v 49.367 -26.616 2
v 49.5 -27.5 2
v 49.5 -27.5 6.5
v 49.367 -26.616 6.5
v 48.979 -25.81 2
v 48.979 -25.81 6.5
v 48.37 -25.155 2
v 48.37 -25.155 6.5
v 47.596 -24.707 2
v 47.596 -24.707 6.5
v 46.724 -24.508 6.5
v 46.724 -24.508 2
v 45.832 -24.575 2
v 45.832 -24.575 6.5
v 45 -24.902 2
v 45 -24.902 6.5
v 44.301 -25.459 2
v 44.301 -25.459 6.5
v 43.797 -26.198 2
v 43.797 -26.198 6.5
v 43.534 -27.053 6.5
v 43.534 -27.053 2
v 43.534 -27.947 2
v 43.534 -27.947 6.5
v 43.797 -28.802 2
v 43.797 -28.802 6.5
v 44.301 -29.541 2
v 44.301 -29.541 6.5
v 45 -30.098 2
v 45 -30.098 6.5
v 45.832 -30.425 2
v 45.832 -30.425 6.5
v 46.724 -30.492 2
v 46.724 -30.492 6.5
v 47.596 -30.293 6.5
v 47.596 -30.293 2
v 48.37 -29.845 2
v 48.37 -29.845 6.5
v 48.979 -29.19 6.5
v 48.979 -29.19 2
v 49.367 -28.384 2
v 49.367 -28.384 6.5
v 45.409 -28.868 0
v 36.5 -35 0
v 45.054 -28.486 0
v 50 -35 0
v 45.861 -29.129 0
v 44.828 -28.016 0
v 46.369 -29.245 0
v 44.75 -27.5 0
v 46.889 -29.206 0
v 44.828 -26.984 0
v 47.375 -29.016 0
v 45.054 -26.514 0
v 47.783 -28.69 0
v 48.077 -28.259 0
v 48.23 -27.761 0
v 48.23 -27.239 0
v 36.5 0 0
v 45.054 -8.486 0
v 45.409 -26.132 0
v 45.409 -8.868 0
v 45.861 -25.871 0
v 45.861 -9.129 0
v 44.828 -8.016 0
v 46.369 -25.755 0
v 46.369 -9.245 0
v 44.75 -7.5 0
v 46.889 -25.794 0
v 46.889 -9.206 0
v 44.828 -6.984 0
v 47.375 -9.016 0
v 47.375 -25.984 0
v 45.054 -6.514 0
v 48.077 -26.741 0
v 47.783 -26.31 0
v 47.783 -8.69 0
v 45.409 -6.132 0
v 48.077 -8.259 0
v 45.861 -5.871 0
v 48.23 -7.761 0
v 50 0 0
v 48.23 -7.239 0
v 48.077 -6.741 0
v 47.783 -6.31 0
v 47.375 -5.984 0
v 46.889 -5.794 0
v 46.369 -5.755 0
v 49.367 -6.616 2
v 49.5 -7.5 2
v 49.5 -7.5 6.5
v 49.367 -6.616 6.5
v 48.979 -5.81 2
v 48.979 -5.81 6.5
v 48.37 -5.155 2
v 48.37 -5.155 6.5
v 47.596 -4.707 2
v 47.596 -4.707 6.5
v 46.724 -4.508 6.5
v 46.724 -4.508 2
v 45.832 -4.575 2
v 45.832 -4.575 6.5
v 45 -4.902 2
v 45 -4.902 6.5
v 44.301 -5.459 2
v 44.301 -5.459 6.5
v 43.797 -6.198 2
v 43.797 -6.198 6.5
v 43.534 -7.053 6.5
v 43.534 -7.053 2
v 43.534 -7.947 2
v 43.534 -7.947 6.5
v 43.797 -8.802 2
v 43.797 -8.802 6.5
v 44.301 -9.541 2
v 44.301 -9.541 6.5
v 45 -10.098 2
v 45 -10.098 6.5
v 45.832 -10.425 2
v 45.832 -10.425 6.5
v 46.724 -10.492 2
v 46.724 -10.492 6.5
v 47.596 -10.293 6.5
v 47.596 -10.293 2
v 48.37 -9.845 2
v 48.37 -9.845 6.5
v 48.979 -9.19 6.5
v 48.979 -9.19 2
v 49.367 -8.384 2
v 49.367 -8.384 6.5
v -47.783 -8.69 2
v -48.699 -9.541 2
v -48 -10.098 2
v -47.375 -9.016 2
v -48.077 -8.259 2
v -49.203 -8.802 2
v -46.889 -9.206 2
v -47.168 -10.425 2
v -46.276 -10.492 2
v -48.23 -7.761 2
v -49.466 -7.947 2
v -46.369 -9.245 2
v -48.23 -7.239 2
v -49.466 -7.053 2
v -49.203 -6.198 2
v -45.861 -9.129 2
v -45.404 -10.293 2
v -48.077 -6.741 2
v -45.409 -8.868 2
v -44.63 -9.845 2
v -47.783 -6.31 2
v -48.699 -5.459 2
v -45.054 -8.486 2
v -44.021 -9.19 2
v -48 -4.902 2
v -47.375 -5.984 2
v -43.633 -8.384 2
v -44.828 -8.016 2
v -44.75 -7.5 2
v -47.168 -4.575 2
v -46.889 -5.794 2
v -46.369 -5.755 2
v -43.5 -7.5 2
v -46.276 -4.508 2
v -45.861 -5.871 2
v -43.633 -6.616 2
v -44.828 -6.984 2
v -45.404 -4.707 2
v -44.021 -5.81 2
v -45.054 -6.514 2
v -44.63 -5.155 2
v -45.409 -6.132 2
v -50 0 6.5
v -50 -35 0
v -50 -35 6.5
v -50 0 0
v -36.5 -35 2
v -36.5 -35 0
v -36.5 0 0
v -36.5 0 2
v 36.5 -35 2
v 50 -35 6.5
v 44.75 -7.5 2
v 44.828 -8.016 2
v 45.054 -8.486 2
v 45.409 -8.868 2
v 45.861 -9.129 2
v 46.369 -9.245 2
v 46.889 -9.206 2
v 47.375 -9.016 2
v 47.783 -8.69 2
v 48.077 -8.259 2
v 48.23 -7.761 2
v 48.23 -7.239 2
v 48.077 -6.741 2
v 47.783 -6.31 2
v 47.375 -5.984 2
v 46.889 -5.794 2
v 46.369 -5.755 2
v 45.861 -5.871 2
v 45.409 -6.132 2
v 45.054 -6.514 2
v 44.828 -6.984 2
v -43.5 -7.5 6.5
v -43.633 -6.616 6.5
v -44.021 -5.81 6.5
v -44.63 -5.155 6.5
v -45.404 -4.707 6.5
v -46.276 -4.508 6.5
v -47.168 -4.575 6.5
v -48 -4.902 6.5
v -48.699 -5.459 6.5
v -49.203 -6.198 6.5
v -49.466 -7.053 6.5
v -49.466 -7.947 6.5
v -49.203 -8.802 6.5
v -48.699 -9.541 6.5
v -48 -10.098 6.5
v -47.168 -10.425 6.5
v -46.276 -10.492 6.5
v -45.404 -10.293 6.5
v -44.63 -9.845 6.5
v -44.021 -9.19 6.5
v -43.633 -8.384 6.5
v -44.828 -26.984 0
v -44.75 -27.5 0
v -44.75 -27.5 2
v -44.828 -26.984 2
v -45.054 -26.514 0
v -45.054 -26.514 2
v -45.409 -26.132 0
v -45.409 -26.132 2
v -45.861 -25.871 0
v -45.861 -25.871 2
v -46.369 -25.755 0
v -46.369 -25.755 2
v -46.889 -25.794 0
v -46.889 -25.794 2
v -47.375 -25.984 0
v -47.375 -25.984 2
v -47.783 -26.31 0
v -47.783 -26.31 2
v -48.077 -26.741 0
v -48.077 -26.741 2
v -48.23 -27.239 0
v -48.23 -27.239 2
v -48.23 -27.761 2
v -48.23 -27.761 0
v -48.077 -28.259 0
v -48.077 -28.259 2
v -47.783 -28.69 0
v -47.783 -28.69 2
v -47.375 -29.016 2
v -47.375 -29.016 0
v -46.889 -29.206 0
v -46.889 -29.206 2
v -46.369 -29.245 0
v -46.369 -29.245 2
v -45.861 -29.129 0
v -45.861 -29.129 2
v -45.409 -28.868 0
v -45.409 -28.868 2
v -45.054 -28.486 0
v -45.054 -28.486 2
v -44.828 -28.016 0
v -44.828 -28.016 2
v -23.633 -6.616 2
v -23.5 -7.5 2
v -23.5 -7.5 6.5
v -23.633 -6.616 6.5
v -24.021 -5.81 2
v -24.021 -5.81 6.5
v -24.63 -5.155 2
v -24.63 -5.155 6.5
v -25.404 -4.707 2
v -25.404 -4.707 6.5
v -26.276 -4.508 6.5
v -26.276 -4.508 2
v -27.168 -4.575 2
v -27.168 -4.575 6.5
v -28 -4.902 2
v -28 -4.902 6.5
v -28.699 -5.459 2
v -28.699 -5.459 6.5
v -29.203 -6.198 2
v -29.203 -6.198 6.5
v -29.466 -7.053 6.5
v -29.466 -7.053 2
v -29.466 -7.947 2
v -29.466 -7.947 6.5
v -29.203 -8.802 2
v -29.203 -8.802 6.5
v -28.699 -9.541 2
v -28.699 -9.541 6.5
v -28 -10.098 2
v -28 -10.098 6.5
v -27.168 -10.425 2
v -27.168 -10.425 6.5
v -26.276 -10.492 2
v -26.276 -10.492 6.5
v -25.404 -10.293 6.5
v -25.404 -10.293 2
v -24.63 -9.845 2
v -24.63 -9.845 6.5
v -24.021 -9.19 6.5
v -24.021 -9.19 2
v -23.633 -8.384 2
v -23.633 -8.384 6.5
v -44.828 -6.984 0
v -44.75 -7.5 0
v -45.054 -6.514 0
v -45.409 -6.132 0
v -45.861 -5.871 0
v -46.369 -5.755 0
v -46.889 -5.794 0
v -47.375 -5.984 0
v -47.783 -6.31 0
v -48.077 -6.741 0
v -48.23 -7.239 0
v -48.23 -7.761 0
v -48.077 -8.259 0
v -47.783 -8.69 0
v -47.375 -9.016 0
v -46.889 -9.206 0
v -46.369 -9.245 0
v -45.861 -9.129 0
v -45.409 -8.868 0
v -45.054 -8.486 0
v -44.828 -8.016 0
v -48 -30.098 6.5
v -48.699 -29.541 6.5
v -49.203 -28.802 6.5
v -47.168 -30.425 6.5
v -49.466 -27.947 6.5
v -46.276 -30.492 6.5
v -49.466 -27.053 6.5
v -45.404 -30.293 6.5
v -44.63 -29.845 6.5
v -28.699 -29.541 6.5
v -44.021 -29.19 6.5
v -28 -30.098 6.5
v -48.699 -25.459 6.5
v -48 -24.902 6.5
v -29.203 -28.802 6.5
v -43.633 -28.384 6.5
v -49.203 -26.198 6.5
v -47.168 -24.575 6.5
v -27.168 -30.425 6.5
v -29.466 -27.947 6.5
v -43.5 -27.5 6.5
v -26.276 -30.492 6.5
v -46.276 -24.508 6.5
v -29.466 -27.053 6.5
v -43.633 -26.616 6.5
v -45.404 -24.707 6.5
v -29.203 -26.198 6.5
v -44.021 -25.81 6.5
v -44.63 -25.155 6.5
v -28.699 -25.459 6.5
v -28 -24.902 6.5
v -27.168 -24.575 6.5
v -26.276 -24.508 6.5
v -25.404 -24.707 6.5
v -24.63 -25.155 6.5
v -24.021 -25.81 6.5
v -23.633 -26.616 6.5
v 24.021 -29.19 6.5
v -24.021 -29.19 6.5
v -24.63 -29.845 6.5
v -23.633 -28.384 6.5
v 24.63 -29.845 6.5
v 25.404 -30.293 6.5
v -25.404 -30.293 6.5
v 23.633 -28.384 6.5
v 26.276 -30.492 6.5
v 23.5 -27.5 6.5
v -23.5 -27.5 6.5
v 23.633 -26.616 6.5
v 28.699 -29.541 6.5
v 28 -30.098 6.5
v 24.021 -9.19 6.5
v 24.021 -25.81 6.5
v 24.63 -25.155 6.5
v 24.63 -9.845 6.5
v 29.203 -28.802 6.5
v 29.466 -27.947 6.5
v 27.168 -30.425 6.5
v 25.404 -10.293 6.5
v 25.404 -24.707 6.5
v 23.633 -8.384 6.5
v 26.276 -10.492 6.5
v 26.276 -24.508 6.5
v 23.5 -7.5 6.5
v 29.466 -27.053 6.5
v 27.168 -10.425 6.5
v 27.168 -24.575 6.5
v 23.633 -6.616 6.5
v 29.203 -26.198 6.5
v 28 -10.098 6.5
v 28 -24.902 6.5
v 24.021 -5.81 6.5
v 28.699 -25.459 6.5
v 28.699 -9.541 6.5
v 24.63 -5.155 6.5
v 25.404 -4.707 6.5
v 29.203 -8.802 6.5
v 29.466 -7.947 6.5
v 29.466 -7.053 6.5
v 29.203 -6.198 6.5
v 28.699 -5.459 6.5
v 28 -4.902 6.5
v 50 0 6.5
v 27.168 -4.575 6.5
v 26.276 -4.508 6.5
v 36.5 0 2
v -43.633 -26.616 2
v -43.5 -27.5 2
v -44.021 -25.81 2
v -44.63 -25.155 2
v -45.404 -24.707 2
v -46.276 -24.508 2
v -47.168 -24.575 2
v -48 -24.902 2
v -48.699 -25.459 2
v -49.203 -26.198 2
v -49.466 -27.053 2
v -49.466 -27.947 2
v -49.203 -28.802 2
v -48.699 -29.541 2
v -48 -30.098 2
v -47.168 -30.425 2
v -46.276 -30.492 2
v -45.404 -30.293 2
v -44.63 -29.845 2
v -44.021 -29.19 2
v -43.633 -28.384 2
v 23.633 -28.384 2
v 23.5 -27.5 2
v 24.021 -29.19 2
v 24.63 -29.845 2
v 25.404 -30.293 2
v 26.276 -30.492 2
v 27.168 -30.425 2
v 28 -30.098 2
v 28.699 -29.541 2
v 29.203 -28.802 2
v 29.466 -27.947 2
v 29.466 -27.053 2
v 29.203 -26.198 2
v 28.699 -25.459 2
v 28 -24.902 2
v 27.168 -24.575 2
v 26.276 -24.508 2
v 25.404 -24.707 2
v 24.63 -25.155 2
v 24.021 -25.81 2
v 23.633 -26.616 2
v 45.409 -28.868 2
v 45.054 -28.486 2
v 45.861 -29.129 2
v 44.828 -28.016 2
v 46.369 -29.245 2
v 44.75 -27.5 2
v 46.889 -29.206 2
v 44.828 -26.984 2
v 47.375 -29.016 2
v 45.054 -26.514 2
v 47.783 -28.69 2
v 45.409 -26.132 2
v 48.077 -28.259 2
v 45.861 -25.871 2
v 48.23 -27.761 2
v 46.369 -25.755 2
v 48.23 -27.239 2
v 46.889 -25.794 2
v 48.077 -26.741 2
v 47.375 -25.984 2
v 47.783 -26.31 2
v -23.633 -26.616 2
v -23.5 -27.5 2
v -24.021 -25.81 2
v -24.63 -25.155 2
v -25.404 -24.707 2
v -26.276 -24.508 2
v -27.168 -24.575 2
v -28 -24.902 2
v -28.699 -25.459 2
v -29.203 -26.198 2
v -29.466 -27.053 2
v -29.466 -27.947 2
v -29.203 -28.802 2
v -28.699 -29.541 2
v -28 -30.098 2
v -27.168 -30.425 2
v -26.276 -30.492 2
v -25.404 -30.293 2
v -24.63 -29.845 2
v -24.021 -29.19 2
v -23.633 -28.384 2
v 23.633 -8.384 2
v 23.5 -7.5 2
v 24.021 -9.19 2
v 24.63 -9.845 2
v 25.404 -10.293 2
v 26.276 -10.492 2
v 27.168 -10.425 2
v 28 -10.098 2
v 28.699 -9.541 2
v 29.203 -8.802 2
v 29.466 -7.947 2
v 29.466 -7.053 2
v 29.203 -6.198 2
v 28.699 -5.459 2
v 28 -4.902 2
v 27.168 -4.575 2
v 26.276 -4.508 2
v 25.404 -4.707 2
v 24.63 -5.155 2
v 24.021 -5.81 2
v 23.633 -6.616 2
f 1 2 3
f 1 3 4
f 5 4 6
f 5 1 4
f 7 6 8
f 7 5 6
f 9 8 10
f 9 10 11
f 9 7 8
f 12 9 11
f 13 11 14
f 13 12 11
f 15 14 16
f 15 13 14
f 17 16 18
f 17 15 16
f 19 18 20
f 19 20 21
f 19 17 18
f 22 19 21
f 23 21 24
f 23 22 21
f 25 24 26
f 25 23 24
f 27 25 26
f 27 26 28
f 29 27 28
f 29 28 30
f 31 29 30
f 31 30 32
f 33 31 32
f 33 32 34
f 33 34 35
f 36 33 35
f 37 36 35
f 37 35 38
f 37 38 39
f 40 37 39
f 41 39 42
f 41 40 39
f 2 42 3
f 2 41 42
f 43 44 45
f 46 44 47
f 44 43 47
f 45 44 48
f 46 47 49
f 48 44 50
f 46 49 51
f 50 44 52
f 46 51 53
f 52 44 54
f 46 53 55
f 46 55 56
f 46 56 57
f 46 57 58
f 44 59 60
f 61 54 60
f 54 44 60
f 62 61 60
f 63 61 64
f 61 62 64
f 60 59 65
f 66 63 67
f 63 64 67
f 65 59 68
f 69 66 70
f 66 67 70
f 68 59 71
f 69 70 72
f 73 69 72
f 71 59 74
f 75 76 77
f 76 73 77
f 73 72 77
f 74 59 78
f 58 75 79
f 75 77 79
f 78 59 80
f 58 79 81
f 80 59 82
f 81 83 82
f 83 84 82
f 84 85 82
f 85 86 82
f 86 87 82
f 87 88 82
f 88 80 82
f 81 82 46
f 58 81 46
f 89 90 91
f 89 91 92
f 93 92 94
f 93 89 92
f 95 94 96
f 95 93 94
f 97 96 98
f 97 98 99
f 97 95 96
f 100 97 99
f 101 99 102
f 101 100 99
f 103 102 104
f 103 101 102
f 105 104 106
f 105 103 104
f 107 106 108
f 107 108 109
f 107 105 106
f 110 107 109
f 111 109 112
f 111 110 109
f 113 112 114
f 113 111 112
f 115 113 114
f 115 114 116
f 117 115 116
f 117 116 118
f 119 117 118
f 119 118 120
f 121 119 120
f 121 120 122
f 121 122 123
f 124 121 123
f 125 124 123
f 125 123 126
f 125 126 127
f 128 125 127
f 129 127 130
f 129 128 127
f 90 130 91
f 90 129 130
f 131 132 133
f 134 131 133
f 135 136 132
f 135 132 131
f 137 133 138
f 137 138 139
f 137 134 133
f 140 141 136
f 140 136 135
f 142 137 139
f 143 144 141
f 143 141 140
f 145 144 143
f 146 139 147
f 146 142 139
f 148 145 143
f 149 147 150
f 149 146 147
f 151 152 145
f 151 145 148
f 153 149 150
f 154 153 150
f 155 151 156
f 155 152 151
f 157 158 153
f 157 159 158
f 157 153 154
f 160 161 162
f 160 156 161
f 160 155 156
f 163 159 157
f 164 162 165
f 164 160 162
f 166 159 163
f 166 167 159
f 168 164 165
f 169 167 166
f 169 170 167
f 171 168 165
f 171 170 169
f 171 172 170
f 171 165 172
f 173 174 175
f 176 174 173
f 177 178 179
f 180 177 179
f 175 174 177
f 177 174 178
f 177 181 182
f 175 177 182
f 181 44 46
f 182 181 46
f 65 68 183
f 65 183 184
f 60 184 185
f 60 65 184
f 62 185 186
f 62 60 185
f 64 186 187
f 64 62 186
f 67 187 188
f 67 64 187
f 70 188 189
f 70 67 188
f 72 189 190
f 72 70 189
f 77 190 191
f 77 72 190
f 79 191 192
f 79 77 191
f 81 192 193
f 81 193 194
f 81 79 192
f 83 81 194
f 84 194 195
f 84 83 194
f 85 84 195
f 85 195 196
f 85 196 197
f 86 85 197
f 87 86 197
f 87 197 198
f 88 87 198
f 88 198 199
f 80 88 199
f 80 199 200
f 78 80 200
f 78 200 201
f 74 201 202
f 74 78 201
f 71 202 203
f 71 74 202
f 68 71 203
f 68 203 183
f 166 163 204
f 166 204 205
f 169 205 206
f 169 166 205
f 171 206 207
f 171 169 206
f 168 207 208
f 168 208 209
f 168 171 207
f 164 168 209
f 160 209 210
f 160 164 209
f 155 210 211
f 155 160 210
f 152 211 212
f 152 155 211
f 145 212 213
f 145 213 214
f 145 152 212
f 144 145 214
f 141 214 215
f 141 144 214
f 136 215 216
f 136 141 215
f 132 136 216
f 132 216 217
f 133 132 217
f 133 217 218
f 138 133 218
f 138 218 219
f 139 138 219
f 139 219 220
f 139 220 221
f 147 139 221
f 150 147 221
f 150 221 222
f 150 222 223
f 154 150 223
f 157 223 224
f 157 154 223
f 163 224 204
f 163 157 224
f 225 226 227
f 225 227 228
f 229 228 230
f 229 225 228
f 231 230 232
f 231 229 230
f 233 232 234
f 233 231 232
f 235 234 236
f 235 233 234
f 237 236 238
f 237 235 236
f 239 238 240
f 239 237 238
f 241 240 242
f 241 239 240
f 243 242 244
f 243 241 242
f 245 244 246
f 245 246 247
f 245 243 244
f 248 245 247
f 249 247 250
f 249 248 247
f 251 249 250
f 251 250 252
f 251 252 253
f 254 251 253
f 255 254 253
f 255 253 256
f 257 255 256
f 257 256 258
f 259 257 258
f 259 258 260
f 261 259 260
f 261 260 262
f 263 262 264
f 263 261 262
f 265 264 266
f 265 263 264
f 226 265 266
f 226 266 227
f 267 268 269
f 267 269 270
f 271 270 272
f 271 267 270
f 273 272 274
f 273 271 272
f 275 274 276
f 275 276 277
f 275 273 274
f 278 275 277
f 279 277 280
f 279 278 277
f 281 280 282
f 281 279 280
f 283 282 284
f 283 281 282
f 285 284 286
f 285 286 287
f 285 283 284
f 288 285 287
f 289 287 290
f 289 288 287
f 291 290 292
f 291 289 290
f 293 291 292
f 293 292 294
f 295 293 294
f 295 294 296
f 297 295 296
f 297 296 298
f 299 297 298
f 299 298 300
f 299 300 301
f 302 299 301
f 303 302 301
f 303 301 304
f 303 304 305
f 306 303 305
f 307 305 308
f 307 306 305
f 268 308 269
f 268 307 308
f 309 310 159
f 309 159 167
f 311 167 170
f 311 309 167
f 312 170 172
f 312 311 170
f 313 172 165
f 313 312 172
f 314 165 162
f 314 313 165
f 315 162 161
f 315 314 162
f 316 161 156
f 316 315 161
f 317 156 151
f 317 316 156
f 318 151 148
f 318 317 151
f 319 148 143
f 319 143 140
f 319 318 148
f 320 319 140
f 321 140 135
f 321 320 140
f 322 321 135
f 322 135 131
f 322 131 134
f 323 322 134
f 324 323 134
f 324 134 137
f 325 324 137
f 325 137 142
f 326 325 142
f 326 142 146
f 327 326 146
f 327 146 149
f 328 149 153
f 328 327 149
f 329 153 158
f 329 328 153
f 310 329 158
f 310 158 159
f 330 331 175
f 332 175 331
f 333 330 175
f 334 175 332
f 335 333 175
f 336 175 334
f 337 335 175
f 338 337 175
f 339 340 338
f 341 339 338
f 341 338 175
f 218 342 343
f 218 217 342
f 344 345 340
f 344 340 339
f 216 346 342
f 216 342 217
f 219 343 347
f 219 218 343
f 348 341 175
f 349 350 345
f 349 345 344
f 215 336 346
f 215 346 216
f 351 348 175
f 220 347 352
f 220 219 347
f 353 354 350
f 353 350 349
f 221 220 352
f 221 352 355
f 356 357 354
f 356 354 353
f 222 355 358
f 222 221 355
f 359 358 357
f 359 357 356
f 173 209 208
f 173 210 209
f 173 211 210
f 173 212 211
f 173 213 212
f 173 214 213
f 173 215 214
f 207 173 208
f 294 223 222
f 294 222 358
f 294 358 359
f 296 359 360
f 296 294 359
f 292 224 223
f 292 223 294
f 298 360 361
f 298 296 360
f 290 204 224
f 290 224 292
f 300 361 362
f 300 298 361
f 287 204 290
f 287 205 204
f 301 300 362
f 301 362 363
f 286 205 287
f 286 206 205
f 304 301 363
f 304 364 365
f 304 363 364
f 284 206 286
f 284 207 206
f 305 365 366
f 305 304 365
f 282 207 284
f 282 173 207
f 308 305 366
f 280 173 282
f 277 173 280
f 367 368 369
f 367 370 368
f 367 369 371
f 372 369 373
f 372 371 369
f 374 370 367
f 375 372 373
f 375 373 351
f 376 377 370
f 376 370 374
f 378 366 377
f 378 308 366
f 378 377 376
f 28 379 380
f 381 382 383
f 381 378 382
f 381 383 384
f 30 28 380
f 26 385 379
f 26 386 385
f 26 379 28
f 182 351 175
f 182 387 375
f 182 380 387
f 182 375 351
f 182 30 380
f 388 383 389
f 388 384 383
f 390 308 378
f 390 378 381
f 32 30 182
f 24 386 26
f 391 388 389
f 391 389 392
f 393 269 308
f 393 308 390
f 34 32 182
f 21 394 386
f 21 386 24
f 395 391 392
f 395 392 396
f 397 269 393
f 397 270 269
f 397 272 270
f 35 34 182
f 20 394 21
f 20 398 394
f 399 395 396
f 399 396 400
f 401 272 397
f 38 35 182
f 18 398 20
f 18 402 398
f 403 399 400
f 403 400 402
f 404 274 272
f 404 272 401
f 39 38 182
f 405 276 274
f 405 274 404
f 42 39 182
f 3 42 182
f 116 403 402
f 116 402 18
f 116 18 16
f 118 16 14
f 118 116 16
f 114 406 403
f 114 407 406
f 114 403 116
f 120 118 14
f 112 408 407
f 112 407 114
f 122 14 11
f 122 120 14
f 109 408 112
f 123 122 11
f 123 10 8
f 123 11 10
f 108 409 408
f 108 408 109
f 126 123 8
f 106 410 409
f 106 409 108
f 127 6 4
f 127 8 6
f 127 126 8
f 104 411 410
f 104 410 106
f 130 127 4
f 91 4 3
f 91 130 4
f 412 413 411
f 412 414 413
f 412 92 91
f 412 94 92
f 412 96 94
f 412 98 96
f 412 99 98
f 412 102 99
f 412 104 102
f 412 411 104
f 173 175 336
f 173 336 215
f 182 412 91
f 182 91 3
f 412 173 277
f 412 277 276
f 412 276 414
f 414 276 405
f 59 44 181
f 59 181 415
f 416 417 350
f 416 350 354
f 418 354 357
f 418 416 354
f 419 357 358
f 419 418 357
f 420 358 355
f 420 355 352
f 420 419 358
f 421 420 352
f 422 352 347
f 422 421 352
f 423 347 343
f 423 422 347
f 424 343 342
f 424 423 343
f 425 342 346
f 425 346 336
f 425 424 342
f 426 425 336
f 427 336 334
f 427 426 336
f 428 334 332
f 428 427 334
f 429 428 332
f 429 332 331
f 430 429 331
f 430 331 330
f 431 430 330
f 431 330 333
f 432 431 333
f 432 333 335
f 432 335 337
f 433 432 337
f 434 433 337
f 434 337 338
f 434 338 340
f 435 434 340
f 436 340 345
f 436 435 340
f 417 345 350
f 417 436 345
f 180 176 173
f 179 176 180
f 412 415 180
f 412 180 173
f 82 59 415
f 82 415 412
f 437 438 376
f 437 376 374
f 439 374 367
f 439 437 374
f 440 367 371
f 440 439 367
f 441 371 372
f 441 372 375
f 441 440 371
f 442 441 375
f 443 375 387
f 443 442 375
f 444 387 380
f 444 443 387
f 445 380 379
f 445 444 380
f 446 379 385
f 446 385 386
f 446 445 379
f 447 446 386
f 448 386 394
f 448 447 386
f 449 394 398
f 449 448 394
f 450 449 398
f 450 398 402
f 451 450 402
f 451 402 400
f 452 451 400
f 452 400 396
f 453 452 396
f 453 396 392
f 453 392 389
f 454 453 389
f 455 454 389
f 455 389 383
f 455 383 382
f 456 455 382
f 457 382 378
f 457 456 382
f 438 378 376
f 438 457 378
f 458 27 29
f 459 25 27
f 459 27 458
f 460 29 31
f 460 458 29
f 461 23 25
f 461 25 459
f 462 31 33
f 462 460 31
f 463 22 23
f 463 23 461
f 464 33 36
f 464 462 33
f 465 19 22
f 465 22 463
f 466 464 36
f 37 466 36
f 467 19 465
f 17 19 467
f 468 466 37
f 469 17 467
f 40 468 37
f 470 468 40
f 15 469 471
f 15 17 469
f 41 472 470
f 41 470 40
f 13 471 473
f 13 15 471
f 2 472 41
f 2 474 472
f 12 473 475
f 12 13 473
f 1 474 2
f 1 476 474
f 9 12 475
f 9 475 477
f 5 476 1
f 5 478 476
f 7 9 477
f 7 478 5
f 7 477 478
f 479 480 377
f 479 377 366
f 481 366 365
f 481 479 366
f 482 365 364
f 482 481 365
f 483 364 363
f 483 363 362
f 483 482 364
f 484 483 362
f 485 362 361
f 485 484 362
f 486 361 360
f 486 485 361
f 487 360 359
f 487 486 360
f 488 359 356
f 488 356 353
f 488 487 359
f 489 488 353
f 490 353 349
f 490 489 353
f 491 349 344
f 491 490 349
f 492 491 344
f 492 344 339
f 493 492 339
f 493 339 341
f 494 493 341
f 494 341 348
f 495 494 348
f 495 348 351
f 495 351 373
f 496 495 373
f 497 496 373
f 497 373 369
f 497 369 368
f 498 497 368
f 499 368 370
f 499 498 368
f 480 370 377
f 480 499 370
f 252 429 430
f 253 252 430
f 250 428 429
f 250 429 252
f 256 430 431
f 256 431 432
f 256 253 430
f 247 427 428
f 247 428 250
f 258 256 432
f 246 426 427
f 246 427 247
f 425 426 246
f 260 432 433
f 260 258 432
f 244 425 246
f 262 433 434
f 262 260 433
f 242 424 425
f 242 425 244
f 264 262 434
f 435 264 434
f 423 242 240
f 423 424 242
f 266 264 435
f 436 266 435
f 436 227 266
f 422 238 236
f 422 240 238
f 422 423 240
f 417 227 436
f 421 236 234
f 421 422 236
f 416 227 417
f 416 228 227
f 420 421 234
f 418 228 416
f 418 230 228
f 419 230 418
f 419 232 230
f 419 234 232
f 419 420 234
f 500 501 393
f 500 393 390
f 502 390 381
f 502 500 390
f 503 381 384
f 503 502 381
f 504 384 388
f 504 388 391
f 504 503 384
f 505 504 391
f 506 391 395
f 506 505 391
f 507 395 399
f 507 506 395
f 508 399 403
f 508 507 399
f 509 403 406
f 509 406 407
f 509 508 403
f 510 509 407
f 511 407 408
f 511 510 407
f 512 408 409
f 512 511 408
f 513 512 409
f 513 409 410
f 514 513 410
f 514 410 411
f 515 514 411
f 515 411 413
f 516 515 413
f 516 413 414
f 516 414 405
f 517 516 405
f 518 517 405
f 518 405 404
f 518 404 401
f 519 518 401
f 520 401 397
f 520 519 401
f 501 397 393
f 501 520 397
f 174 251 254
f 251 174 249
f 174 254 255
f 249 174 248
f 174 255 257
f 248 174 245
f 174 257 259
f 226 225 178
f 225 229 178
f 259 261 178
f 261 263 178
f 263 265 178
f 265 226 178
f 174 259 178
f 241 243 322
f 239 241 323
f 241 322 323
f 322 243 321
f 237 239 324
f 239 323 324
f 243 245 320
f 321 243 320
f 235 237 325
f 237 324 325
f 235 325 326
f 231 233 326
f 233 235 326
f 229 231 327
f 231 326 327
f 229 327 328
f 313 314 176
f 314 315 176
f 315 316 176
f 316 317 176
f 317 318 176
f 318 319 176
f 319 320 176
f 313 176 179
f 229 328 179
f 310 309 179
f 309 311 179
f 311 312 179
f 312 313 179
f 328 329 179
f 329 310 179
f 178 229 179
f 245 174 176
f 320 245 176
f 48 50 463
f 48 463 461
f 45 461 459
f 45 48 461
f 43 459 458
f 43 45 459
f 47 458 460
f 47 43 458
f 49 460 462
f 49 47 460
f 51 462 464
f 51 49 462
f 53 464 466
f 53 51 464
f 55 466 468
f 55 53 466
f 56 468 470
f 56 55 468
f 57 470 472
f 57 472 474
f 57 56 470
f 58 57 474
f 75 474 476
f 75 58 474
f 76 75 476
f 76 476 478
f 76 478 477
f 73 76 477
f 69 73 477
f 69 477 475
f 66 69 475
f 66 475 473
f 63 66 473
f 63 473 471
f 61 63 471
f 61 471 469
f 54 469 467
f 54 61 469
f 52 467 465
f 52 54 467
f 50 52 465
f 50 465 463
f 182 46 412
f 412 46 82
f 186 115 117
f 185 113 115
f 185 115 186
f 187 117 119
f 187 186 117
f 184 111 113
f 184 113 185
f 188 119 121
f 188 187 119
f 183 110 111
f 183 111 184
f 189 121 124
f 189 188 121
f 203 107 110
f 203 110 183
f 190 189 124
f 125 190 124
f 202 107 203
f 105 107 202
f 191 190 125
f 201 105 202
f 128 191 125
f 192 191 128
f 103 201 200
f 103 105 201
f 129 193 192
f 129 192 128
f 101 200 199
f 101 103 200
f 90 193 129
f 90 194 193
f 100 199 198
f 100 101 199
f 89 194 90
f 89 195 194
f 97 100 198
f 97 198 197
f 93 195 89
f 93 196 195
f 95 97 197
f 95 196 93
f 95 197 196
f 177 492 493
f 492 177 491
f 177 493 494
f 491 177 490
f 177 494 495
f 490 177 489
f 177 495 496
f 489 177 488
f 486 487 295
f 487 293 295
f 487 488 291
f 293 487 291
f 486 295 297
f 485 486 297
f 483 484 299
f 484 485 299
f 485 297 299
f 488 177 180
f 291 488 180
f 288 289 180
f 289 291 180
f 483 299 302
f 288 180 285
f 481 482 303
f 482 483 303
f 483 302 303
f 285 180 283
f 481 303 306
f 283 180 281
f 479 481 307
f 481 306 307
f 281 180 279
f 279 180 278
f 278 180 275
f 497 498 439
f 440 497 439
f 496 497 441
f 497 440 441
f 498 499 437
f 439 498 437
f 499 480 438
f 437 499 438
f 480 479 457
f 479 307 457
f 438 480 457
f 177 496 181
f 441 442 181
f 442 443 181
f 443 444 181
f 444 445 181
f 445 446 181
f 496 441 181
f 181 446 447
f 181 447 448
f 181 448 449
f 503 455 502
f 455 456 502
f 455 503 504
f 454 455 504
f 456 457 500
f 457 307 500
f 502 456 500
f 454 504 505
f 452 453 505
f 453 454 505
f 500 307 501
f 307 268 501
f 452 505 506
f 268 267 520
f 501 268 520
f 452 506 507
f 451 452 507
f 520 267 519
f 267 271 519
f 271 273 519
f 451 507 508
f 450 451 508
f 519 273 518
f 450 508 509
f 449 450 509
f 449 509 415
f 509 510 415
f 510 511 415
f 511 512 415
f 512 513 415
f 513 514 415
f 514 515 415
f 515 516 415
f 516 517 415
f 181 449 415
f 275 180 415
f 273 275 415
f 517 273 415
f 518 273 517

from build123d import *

# Parameters (mm, degrees)
ESQUISSE1_W          = 13.5
ESQUISSE1_H          = 35
ESQUISSE1_R          = 1.75
BOSS_EXTRU_1_DEPTH   = 2
BOSS_EXTRU_1_2_DEPTH = 2
ESQUISSE2_W          = 100
ESQUISSE2_H          = 35
ESQUISSE2_R          = 3
BOSS_EXTRU_2_DEPTH   = 4.5


with BuildPart() as part:
    # Esquisse1 → Boss.-Extru.1 (new body)
    with BuildSketch(Plane.XY):
        with Locations((-43.25, -17.5)):
            Rectangle(ESQUISSE1_W, ESQUISSE1_H)
        with Locations((-46.5, -7.5)):
            Circle(ESQUISSE1_R, mode=Mode.SUBTRACT)
        with Locations((-46.5, -27.5)):
            Circle(ESQUISSE1_R, mode=Mode.SUBTRACT)
    extrude(amount=BOSS_EXTRU_1_DEPTH)



with BuildPart() as body_2:
    # Esquisse1 → Boss.-Extru.1 2 (new body)
    with BuildSketch(Plane.XY):
        with Locations((43.25, -17.5)):
            Rectangle(ESQUISSE1_W, ESQUISSE1_H)
        with Locations(Location((46.5, -27.5, 0), (0, 0, 180))):
            Circle(ESQUISSE1_R, mode=Mode.SUBTRACT)
        with Locations(Location((46.5, -7.5, 0), (0, 0, 180))):
            Circle(ESQUISSE1_R, mode=Mode.SUBTRACT)
    extrude(amount=BOSS_EXTRU_1_2_DEPTH)


with BuildPart() as part_1:
    add(part.part)

    add(body_2.part)  # Boss.-Extru.2 merges body 2
    # Esquisse2 → Boss.-Extru.2 (add)
    with BuildSketch(Plane.XY.offset(2)):
        with Locations((0, -17.5)):
            Rectangle(ESQUISSE2_W, ESQUISSE2_H)
        with Locations((-46.5, -7.5)):
            Circle(ESQUISSE2_R, mode=Mode.SUBTRACT)
        with Locations((-46.5, -27.5)):
            Circle(ESQUISSE2_R, mode=Mode.SUBTRACT)
        with Locations((46.5, -7.5)):
            Circle(ESQUISSE2_R, mode=Mode.SUBTRACT)
        with Locations((46.5, -27.5)):
            Circle(ESQUISSE2_R, mode=Mode.SUBTRACT)
        with Locations((-26.5, -7.5)):
            Circle(ESQUISSE2_R, mode=Mode.SUBTRACT)
        with Locations((-26.5, -27.5)):
            Circle(ESQUISSE2_R, mode=Mode.SUBTRACT)
        with Locations(Location((26.5, -27.5, 0), (0, 0, 180))):
            Circle(ESQUISSE2_R, mode=Mode.SUBTRACT)
        with Locations(Location((26.5, -7.5, 0), (0, 0, 180))):
            Circle(ESQUISSE2_R, mode=Mode.SUBTRACT)
    extrude(amount=BOSS_EXTRU_2_DEPTH)


solid = part_1.part
